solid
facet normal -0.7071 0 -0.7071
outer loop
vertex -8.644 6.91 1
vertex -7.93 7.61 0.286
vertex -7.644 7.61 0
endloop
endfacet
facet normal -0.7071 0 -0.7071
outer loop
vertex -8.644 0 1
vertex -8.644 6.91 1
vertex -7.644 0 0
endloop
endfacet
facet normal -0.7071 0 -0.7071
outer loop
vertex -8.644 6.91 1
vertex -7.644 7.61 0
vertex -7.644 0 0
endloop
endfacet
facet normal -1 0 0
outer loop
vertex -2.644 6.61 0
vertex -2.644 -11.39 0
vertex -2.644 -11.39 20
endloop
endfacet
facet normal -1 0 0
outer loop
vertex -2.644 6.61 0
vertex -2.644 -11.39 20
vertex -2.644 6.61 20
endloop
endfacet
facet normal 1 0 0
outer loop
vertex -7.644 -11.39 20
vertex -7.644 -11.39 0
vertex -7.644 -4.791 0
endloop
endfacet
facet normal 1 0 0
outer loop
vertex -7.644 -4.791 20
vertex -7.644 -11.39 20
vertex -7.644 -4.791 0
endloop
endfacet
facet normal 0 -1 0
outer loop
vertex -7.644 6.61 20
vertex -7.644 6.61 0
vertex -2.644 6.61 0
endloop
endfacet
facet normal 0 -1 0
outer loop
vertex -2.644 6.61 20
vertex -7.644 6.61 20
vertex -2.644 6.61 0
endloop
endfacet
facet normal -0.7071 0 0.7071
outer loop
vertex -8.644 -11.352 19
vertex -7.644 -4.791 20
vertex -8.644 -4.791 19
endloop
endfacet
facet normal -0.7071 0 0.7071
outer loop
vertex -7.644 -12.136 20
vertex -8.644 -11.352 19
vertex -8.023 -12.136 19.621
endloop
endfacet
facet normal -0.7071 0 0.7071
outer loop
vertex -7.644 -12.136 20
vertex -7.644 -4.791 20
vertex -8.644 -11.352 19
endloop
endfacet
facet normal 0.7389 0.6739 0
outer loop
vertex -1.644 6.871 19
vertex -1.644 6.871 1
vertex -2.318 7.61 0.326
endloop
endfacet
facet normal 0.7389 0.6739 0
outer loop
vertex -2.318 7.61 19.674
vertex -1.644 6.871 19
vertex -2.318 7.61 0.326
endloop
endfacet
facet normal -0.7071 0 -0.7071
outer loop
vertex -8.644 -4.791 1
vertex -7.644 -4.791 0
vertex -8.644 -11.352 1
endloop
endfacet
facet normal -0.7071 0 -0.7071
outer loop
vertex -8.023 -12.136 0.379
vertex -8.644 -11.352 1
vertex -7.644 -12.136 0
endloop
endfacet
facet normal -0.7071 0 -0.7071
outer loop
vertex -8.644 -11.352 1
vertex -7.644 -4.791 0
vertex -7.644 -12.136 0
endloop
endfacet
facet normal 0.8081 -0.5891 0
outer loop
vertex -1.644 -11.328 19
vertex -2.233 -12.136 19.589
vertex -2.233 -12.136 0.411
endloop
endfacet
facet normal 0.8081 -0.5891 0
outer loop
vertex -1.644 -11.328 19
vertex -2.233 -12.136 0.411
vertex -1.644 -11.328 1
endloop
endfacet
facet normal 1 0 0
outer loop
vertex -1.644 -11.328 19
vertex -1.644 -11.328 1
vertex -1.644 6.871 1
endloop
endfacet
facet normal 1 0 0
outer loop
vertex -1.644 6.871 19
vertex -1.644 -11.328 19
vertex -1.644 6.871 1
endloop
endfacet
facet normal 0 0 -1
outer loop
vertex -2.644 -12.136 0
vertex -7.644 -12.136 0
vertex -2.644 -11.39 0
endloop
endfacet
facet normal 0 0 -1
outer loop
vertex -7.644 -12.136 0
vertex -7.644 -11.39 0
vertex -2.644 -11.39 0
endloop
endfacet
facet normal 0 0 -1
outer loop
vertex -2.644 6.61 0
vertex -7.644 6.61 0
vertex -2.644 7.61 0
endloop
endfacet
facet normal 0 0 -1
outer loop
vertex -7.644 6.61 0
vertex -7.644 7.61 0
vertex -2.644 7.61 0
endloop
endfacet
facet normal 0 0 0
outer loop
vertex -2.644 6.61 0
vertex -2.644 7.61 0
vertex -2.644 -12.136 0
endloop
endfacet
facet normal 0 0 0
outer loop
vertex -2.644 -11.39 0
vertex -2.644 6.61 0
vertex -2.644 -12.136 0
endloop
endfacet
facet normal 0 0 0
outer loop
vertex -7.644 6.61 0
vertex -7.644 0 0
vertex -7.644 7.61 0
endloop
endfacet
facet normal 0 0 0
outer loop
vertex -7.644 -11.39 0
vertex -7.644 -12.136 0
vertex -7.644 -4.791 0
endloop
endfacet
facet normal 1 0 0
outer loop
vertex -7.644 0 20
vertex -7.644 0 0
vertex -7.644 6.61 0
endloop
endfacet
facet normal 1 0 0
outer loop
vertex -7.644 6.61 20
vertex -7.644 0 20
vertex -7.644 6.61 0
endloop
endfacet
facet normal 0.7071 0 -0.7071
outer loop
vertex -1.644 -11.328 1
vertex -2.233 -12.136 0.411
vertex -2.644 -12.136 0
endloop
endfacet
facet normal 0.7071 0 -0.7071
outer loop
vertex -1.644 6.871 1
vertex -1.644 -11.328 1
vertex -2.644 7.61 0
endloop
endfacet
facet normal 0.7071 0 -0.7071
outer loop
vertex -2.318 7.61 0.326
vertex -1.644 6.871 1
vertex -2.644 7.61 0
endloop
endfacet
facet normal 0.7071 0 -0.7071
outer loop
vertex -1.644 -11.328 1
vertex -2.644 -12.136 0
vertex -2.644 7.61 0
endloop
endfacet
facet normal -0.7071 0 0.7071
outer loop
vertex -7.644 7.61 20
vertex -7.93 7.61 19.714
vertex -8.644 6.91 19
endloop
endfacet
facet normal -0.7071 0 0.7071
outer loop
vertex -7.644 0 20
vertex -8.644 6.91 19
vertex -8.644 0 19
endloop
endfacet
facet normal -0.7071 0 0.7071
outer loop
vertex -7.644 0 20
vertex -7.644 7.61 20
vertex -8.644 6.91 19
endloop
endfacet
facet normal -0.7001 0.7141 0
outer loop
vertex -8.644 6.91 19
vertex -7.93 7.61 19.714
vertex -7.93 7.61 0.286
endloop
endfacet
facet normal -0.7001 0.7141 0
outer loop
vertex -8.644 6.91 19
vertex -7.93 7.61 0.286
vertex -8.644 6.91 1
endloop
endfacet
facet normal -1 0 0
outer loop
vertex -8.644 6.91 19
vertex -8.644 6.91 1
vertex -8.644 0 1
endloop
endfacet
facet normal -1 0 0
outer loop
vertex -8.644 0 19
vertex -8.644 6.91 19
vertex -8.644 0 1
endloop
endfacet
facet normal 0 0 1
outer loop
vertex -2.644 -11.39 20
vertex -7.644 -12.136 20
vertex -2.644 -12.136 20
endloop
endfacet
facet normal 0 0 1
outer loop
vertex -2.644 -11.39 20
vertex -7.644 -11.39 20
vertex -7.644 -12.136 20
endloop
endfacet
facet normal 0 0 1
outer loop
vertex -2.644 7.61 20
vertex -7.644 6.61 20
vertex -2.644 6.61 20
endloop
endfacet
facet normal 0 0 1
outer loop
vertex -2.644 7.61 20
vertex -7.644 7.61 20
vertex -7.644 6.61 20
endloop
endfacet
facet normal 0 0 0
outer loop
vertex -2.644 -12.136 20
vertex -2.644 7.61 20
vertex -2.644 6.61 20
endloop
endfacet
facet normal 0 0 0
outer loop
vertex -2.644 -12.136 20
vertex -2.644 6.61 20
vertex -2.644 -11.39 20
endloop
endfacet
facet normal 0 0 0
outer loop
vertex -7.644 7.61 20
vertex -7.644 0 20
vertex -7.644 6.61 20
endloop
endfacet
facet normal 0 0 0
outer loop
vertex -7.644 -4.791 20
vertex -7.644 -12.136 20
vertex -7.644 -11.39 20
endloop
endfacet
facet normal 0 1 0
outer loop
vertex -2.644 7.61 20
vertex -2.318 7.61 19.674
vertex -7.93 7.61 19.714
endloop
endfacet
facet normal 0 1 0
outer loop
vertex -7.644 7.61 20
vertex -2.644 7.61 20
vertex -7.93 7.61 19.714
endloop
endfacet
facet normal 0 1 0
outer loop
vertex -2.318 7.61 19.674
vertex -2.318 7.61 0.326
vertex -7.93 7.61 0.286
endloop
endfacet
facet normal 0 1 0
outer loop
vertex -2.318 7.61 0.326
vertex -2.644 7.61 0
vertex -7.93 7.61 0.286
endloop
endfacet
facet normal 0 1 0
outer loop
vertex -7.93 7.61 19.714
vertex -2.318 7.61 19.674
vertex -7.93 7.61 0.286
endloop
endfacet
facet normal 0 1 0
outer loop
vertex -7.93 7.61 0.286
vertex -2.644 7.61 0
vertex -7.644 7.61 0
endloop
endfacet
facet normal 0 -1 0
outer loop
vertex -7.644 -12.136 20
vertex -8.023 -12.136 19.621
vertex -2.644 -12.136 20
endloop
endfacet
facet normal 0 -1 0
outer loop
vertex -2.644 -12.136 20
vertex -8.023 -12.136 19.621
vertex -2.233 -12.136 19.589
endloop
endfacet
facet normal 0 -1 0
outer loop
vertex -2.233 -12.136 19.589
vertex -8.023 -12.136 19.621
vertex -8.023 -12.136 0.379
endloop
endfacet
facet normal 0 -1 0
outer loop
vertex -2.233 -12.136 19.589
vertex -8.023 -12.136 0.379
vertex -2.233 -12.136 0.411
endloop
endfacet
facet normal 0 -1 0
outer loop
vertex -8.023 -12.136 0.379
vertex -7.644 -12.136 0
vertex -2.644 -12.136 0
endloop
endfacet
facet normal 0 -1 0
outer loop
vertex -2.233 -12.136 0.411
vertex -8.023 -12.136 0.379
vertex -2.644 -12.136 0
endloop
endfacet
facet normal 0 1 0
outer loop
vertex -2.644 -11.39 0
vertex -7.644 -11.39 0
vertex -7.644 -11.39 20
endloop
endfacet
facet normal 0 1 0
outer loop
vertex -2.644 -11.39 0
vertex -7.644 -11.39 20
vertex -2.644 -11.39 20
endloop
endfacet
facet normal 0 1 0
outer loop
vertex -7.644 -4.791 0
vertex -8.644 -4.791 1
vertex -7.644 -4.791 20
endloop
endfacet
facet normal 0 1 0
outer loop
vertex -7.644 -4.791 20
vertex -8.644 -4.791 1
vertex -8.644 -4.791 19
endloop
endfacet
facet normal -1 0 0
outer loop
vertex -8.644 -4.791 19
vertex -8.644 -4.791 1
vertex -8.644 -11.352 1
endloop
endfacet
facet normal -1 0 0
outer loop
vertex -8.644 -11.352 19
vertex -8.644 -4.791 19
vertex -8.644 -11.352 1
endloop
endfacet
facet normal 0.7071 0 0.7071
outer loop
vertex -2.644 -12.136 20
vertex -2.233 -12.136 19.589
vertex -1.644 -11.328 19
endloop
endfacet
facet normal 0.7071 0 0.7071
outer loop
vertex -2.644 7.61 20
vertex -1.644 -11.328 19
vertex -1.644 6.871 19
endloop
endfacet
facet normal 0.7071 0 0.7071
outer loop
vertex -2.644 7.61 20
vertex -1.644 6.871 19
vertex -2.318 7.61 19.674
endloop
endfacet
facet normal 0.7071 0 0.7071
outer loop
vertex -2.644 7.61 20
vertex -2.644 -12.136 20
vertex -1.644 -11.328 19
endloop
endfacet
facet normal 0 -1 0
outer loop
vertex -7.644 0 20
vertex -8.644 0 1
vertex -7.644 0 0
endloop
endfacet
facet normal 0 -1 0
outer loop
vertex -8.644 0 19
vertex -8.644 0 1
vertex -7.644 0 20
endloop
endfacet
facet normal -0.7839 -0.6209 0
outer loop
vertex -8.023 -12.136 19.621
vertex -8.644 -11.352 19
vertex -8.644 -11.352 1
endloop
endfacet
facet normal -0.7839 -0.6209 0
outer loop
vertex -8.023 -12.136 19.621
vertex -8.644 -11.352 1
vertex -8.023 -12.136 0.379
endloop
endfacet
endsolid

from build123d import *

# Parameters (mm, degrees)
F0_W     = 5
F0_H     = 18
F1_DEPTH = 20
F2_SIZE  = 0.99999
F3_W     = 4.7912499867
F3_H     = 21.5901492629
F4_DEPTH = 5


# Not quite as in the source:
# - a fillet or chamfer is up to 0.001 mm smaller than in the source, because OpenCascade refuses the exact size


with BuildPart() as f1:
    # F0 (on Top) → F1 (new body)
    with BuildSketch(Plane.XY):
        Polygon((-2.3178061422, 7.6096997074), (-7.9299724714, 7.6096997074), (-8.6440549978, 6.9096381776), (-8.6440549978, -11.3519806733), (-8.0234205974, -12.1360807569), (-2.2334722516, -12.1360807569), (-1.6440549978, -11.3282519997), (-1.6440549978, 6.8707413895), align=None)
        with Locations((-5.1440549978, -2.3903002926)):
            Rectangle(F0_W, F0_H, mode=Mode.SUBTRACT)
    extrude(amount=F1_DEPTH)

    # F2 (size 1 in the source; OpenCascade refuses exactly that, so slightly less here)
    f2_edges = [f1.edges().sort_by_distance(p)[0] for p in [
        (-8.644055, -2.221171, 20),
        (-8.644055, -2.221171, 0),
        (-1.644055, -2.228755, 0),
        (-1.644055, -2.228755, 20),
    ]]
    chamfer(f2_edges, length=F2_SIZE)

    # F3 (on face) → F4 (cut)
    with BuildSketch(Plane(origin=(-8.6440549978, 0, 0), x_dir=(0, -1, 0), z_dir=(-1, 0, 0))):
        with Locations((2.3956249934, 9.8618984921)):
            Rectangle(F3_W, F3_H)
    extrude(amount=-F4_DEPTH, mode=Mode.SUBTRACT)


solid = f1.part
